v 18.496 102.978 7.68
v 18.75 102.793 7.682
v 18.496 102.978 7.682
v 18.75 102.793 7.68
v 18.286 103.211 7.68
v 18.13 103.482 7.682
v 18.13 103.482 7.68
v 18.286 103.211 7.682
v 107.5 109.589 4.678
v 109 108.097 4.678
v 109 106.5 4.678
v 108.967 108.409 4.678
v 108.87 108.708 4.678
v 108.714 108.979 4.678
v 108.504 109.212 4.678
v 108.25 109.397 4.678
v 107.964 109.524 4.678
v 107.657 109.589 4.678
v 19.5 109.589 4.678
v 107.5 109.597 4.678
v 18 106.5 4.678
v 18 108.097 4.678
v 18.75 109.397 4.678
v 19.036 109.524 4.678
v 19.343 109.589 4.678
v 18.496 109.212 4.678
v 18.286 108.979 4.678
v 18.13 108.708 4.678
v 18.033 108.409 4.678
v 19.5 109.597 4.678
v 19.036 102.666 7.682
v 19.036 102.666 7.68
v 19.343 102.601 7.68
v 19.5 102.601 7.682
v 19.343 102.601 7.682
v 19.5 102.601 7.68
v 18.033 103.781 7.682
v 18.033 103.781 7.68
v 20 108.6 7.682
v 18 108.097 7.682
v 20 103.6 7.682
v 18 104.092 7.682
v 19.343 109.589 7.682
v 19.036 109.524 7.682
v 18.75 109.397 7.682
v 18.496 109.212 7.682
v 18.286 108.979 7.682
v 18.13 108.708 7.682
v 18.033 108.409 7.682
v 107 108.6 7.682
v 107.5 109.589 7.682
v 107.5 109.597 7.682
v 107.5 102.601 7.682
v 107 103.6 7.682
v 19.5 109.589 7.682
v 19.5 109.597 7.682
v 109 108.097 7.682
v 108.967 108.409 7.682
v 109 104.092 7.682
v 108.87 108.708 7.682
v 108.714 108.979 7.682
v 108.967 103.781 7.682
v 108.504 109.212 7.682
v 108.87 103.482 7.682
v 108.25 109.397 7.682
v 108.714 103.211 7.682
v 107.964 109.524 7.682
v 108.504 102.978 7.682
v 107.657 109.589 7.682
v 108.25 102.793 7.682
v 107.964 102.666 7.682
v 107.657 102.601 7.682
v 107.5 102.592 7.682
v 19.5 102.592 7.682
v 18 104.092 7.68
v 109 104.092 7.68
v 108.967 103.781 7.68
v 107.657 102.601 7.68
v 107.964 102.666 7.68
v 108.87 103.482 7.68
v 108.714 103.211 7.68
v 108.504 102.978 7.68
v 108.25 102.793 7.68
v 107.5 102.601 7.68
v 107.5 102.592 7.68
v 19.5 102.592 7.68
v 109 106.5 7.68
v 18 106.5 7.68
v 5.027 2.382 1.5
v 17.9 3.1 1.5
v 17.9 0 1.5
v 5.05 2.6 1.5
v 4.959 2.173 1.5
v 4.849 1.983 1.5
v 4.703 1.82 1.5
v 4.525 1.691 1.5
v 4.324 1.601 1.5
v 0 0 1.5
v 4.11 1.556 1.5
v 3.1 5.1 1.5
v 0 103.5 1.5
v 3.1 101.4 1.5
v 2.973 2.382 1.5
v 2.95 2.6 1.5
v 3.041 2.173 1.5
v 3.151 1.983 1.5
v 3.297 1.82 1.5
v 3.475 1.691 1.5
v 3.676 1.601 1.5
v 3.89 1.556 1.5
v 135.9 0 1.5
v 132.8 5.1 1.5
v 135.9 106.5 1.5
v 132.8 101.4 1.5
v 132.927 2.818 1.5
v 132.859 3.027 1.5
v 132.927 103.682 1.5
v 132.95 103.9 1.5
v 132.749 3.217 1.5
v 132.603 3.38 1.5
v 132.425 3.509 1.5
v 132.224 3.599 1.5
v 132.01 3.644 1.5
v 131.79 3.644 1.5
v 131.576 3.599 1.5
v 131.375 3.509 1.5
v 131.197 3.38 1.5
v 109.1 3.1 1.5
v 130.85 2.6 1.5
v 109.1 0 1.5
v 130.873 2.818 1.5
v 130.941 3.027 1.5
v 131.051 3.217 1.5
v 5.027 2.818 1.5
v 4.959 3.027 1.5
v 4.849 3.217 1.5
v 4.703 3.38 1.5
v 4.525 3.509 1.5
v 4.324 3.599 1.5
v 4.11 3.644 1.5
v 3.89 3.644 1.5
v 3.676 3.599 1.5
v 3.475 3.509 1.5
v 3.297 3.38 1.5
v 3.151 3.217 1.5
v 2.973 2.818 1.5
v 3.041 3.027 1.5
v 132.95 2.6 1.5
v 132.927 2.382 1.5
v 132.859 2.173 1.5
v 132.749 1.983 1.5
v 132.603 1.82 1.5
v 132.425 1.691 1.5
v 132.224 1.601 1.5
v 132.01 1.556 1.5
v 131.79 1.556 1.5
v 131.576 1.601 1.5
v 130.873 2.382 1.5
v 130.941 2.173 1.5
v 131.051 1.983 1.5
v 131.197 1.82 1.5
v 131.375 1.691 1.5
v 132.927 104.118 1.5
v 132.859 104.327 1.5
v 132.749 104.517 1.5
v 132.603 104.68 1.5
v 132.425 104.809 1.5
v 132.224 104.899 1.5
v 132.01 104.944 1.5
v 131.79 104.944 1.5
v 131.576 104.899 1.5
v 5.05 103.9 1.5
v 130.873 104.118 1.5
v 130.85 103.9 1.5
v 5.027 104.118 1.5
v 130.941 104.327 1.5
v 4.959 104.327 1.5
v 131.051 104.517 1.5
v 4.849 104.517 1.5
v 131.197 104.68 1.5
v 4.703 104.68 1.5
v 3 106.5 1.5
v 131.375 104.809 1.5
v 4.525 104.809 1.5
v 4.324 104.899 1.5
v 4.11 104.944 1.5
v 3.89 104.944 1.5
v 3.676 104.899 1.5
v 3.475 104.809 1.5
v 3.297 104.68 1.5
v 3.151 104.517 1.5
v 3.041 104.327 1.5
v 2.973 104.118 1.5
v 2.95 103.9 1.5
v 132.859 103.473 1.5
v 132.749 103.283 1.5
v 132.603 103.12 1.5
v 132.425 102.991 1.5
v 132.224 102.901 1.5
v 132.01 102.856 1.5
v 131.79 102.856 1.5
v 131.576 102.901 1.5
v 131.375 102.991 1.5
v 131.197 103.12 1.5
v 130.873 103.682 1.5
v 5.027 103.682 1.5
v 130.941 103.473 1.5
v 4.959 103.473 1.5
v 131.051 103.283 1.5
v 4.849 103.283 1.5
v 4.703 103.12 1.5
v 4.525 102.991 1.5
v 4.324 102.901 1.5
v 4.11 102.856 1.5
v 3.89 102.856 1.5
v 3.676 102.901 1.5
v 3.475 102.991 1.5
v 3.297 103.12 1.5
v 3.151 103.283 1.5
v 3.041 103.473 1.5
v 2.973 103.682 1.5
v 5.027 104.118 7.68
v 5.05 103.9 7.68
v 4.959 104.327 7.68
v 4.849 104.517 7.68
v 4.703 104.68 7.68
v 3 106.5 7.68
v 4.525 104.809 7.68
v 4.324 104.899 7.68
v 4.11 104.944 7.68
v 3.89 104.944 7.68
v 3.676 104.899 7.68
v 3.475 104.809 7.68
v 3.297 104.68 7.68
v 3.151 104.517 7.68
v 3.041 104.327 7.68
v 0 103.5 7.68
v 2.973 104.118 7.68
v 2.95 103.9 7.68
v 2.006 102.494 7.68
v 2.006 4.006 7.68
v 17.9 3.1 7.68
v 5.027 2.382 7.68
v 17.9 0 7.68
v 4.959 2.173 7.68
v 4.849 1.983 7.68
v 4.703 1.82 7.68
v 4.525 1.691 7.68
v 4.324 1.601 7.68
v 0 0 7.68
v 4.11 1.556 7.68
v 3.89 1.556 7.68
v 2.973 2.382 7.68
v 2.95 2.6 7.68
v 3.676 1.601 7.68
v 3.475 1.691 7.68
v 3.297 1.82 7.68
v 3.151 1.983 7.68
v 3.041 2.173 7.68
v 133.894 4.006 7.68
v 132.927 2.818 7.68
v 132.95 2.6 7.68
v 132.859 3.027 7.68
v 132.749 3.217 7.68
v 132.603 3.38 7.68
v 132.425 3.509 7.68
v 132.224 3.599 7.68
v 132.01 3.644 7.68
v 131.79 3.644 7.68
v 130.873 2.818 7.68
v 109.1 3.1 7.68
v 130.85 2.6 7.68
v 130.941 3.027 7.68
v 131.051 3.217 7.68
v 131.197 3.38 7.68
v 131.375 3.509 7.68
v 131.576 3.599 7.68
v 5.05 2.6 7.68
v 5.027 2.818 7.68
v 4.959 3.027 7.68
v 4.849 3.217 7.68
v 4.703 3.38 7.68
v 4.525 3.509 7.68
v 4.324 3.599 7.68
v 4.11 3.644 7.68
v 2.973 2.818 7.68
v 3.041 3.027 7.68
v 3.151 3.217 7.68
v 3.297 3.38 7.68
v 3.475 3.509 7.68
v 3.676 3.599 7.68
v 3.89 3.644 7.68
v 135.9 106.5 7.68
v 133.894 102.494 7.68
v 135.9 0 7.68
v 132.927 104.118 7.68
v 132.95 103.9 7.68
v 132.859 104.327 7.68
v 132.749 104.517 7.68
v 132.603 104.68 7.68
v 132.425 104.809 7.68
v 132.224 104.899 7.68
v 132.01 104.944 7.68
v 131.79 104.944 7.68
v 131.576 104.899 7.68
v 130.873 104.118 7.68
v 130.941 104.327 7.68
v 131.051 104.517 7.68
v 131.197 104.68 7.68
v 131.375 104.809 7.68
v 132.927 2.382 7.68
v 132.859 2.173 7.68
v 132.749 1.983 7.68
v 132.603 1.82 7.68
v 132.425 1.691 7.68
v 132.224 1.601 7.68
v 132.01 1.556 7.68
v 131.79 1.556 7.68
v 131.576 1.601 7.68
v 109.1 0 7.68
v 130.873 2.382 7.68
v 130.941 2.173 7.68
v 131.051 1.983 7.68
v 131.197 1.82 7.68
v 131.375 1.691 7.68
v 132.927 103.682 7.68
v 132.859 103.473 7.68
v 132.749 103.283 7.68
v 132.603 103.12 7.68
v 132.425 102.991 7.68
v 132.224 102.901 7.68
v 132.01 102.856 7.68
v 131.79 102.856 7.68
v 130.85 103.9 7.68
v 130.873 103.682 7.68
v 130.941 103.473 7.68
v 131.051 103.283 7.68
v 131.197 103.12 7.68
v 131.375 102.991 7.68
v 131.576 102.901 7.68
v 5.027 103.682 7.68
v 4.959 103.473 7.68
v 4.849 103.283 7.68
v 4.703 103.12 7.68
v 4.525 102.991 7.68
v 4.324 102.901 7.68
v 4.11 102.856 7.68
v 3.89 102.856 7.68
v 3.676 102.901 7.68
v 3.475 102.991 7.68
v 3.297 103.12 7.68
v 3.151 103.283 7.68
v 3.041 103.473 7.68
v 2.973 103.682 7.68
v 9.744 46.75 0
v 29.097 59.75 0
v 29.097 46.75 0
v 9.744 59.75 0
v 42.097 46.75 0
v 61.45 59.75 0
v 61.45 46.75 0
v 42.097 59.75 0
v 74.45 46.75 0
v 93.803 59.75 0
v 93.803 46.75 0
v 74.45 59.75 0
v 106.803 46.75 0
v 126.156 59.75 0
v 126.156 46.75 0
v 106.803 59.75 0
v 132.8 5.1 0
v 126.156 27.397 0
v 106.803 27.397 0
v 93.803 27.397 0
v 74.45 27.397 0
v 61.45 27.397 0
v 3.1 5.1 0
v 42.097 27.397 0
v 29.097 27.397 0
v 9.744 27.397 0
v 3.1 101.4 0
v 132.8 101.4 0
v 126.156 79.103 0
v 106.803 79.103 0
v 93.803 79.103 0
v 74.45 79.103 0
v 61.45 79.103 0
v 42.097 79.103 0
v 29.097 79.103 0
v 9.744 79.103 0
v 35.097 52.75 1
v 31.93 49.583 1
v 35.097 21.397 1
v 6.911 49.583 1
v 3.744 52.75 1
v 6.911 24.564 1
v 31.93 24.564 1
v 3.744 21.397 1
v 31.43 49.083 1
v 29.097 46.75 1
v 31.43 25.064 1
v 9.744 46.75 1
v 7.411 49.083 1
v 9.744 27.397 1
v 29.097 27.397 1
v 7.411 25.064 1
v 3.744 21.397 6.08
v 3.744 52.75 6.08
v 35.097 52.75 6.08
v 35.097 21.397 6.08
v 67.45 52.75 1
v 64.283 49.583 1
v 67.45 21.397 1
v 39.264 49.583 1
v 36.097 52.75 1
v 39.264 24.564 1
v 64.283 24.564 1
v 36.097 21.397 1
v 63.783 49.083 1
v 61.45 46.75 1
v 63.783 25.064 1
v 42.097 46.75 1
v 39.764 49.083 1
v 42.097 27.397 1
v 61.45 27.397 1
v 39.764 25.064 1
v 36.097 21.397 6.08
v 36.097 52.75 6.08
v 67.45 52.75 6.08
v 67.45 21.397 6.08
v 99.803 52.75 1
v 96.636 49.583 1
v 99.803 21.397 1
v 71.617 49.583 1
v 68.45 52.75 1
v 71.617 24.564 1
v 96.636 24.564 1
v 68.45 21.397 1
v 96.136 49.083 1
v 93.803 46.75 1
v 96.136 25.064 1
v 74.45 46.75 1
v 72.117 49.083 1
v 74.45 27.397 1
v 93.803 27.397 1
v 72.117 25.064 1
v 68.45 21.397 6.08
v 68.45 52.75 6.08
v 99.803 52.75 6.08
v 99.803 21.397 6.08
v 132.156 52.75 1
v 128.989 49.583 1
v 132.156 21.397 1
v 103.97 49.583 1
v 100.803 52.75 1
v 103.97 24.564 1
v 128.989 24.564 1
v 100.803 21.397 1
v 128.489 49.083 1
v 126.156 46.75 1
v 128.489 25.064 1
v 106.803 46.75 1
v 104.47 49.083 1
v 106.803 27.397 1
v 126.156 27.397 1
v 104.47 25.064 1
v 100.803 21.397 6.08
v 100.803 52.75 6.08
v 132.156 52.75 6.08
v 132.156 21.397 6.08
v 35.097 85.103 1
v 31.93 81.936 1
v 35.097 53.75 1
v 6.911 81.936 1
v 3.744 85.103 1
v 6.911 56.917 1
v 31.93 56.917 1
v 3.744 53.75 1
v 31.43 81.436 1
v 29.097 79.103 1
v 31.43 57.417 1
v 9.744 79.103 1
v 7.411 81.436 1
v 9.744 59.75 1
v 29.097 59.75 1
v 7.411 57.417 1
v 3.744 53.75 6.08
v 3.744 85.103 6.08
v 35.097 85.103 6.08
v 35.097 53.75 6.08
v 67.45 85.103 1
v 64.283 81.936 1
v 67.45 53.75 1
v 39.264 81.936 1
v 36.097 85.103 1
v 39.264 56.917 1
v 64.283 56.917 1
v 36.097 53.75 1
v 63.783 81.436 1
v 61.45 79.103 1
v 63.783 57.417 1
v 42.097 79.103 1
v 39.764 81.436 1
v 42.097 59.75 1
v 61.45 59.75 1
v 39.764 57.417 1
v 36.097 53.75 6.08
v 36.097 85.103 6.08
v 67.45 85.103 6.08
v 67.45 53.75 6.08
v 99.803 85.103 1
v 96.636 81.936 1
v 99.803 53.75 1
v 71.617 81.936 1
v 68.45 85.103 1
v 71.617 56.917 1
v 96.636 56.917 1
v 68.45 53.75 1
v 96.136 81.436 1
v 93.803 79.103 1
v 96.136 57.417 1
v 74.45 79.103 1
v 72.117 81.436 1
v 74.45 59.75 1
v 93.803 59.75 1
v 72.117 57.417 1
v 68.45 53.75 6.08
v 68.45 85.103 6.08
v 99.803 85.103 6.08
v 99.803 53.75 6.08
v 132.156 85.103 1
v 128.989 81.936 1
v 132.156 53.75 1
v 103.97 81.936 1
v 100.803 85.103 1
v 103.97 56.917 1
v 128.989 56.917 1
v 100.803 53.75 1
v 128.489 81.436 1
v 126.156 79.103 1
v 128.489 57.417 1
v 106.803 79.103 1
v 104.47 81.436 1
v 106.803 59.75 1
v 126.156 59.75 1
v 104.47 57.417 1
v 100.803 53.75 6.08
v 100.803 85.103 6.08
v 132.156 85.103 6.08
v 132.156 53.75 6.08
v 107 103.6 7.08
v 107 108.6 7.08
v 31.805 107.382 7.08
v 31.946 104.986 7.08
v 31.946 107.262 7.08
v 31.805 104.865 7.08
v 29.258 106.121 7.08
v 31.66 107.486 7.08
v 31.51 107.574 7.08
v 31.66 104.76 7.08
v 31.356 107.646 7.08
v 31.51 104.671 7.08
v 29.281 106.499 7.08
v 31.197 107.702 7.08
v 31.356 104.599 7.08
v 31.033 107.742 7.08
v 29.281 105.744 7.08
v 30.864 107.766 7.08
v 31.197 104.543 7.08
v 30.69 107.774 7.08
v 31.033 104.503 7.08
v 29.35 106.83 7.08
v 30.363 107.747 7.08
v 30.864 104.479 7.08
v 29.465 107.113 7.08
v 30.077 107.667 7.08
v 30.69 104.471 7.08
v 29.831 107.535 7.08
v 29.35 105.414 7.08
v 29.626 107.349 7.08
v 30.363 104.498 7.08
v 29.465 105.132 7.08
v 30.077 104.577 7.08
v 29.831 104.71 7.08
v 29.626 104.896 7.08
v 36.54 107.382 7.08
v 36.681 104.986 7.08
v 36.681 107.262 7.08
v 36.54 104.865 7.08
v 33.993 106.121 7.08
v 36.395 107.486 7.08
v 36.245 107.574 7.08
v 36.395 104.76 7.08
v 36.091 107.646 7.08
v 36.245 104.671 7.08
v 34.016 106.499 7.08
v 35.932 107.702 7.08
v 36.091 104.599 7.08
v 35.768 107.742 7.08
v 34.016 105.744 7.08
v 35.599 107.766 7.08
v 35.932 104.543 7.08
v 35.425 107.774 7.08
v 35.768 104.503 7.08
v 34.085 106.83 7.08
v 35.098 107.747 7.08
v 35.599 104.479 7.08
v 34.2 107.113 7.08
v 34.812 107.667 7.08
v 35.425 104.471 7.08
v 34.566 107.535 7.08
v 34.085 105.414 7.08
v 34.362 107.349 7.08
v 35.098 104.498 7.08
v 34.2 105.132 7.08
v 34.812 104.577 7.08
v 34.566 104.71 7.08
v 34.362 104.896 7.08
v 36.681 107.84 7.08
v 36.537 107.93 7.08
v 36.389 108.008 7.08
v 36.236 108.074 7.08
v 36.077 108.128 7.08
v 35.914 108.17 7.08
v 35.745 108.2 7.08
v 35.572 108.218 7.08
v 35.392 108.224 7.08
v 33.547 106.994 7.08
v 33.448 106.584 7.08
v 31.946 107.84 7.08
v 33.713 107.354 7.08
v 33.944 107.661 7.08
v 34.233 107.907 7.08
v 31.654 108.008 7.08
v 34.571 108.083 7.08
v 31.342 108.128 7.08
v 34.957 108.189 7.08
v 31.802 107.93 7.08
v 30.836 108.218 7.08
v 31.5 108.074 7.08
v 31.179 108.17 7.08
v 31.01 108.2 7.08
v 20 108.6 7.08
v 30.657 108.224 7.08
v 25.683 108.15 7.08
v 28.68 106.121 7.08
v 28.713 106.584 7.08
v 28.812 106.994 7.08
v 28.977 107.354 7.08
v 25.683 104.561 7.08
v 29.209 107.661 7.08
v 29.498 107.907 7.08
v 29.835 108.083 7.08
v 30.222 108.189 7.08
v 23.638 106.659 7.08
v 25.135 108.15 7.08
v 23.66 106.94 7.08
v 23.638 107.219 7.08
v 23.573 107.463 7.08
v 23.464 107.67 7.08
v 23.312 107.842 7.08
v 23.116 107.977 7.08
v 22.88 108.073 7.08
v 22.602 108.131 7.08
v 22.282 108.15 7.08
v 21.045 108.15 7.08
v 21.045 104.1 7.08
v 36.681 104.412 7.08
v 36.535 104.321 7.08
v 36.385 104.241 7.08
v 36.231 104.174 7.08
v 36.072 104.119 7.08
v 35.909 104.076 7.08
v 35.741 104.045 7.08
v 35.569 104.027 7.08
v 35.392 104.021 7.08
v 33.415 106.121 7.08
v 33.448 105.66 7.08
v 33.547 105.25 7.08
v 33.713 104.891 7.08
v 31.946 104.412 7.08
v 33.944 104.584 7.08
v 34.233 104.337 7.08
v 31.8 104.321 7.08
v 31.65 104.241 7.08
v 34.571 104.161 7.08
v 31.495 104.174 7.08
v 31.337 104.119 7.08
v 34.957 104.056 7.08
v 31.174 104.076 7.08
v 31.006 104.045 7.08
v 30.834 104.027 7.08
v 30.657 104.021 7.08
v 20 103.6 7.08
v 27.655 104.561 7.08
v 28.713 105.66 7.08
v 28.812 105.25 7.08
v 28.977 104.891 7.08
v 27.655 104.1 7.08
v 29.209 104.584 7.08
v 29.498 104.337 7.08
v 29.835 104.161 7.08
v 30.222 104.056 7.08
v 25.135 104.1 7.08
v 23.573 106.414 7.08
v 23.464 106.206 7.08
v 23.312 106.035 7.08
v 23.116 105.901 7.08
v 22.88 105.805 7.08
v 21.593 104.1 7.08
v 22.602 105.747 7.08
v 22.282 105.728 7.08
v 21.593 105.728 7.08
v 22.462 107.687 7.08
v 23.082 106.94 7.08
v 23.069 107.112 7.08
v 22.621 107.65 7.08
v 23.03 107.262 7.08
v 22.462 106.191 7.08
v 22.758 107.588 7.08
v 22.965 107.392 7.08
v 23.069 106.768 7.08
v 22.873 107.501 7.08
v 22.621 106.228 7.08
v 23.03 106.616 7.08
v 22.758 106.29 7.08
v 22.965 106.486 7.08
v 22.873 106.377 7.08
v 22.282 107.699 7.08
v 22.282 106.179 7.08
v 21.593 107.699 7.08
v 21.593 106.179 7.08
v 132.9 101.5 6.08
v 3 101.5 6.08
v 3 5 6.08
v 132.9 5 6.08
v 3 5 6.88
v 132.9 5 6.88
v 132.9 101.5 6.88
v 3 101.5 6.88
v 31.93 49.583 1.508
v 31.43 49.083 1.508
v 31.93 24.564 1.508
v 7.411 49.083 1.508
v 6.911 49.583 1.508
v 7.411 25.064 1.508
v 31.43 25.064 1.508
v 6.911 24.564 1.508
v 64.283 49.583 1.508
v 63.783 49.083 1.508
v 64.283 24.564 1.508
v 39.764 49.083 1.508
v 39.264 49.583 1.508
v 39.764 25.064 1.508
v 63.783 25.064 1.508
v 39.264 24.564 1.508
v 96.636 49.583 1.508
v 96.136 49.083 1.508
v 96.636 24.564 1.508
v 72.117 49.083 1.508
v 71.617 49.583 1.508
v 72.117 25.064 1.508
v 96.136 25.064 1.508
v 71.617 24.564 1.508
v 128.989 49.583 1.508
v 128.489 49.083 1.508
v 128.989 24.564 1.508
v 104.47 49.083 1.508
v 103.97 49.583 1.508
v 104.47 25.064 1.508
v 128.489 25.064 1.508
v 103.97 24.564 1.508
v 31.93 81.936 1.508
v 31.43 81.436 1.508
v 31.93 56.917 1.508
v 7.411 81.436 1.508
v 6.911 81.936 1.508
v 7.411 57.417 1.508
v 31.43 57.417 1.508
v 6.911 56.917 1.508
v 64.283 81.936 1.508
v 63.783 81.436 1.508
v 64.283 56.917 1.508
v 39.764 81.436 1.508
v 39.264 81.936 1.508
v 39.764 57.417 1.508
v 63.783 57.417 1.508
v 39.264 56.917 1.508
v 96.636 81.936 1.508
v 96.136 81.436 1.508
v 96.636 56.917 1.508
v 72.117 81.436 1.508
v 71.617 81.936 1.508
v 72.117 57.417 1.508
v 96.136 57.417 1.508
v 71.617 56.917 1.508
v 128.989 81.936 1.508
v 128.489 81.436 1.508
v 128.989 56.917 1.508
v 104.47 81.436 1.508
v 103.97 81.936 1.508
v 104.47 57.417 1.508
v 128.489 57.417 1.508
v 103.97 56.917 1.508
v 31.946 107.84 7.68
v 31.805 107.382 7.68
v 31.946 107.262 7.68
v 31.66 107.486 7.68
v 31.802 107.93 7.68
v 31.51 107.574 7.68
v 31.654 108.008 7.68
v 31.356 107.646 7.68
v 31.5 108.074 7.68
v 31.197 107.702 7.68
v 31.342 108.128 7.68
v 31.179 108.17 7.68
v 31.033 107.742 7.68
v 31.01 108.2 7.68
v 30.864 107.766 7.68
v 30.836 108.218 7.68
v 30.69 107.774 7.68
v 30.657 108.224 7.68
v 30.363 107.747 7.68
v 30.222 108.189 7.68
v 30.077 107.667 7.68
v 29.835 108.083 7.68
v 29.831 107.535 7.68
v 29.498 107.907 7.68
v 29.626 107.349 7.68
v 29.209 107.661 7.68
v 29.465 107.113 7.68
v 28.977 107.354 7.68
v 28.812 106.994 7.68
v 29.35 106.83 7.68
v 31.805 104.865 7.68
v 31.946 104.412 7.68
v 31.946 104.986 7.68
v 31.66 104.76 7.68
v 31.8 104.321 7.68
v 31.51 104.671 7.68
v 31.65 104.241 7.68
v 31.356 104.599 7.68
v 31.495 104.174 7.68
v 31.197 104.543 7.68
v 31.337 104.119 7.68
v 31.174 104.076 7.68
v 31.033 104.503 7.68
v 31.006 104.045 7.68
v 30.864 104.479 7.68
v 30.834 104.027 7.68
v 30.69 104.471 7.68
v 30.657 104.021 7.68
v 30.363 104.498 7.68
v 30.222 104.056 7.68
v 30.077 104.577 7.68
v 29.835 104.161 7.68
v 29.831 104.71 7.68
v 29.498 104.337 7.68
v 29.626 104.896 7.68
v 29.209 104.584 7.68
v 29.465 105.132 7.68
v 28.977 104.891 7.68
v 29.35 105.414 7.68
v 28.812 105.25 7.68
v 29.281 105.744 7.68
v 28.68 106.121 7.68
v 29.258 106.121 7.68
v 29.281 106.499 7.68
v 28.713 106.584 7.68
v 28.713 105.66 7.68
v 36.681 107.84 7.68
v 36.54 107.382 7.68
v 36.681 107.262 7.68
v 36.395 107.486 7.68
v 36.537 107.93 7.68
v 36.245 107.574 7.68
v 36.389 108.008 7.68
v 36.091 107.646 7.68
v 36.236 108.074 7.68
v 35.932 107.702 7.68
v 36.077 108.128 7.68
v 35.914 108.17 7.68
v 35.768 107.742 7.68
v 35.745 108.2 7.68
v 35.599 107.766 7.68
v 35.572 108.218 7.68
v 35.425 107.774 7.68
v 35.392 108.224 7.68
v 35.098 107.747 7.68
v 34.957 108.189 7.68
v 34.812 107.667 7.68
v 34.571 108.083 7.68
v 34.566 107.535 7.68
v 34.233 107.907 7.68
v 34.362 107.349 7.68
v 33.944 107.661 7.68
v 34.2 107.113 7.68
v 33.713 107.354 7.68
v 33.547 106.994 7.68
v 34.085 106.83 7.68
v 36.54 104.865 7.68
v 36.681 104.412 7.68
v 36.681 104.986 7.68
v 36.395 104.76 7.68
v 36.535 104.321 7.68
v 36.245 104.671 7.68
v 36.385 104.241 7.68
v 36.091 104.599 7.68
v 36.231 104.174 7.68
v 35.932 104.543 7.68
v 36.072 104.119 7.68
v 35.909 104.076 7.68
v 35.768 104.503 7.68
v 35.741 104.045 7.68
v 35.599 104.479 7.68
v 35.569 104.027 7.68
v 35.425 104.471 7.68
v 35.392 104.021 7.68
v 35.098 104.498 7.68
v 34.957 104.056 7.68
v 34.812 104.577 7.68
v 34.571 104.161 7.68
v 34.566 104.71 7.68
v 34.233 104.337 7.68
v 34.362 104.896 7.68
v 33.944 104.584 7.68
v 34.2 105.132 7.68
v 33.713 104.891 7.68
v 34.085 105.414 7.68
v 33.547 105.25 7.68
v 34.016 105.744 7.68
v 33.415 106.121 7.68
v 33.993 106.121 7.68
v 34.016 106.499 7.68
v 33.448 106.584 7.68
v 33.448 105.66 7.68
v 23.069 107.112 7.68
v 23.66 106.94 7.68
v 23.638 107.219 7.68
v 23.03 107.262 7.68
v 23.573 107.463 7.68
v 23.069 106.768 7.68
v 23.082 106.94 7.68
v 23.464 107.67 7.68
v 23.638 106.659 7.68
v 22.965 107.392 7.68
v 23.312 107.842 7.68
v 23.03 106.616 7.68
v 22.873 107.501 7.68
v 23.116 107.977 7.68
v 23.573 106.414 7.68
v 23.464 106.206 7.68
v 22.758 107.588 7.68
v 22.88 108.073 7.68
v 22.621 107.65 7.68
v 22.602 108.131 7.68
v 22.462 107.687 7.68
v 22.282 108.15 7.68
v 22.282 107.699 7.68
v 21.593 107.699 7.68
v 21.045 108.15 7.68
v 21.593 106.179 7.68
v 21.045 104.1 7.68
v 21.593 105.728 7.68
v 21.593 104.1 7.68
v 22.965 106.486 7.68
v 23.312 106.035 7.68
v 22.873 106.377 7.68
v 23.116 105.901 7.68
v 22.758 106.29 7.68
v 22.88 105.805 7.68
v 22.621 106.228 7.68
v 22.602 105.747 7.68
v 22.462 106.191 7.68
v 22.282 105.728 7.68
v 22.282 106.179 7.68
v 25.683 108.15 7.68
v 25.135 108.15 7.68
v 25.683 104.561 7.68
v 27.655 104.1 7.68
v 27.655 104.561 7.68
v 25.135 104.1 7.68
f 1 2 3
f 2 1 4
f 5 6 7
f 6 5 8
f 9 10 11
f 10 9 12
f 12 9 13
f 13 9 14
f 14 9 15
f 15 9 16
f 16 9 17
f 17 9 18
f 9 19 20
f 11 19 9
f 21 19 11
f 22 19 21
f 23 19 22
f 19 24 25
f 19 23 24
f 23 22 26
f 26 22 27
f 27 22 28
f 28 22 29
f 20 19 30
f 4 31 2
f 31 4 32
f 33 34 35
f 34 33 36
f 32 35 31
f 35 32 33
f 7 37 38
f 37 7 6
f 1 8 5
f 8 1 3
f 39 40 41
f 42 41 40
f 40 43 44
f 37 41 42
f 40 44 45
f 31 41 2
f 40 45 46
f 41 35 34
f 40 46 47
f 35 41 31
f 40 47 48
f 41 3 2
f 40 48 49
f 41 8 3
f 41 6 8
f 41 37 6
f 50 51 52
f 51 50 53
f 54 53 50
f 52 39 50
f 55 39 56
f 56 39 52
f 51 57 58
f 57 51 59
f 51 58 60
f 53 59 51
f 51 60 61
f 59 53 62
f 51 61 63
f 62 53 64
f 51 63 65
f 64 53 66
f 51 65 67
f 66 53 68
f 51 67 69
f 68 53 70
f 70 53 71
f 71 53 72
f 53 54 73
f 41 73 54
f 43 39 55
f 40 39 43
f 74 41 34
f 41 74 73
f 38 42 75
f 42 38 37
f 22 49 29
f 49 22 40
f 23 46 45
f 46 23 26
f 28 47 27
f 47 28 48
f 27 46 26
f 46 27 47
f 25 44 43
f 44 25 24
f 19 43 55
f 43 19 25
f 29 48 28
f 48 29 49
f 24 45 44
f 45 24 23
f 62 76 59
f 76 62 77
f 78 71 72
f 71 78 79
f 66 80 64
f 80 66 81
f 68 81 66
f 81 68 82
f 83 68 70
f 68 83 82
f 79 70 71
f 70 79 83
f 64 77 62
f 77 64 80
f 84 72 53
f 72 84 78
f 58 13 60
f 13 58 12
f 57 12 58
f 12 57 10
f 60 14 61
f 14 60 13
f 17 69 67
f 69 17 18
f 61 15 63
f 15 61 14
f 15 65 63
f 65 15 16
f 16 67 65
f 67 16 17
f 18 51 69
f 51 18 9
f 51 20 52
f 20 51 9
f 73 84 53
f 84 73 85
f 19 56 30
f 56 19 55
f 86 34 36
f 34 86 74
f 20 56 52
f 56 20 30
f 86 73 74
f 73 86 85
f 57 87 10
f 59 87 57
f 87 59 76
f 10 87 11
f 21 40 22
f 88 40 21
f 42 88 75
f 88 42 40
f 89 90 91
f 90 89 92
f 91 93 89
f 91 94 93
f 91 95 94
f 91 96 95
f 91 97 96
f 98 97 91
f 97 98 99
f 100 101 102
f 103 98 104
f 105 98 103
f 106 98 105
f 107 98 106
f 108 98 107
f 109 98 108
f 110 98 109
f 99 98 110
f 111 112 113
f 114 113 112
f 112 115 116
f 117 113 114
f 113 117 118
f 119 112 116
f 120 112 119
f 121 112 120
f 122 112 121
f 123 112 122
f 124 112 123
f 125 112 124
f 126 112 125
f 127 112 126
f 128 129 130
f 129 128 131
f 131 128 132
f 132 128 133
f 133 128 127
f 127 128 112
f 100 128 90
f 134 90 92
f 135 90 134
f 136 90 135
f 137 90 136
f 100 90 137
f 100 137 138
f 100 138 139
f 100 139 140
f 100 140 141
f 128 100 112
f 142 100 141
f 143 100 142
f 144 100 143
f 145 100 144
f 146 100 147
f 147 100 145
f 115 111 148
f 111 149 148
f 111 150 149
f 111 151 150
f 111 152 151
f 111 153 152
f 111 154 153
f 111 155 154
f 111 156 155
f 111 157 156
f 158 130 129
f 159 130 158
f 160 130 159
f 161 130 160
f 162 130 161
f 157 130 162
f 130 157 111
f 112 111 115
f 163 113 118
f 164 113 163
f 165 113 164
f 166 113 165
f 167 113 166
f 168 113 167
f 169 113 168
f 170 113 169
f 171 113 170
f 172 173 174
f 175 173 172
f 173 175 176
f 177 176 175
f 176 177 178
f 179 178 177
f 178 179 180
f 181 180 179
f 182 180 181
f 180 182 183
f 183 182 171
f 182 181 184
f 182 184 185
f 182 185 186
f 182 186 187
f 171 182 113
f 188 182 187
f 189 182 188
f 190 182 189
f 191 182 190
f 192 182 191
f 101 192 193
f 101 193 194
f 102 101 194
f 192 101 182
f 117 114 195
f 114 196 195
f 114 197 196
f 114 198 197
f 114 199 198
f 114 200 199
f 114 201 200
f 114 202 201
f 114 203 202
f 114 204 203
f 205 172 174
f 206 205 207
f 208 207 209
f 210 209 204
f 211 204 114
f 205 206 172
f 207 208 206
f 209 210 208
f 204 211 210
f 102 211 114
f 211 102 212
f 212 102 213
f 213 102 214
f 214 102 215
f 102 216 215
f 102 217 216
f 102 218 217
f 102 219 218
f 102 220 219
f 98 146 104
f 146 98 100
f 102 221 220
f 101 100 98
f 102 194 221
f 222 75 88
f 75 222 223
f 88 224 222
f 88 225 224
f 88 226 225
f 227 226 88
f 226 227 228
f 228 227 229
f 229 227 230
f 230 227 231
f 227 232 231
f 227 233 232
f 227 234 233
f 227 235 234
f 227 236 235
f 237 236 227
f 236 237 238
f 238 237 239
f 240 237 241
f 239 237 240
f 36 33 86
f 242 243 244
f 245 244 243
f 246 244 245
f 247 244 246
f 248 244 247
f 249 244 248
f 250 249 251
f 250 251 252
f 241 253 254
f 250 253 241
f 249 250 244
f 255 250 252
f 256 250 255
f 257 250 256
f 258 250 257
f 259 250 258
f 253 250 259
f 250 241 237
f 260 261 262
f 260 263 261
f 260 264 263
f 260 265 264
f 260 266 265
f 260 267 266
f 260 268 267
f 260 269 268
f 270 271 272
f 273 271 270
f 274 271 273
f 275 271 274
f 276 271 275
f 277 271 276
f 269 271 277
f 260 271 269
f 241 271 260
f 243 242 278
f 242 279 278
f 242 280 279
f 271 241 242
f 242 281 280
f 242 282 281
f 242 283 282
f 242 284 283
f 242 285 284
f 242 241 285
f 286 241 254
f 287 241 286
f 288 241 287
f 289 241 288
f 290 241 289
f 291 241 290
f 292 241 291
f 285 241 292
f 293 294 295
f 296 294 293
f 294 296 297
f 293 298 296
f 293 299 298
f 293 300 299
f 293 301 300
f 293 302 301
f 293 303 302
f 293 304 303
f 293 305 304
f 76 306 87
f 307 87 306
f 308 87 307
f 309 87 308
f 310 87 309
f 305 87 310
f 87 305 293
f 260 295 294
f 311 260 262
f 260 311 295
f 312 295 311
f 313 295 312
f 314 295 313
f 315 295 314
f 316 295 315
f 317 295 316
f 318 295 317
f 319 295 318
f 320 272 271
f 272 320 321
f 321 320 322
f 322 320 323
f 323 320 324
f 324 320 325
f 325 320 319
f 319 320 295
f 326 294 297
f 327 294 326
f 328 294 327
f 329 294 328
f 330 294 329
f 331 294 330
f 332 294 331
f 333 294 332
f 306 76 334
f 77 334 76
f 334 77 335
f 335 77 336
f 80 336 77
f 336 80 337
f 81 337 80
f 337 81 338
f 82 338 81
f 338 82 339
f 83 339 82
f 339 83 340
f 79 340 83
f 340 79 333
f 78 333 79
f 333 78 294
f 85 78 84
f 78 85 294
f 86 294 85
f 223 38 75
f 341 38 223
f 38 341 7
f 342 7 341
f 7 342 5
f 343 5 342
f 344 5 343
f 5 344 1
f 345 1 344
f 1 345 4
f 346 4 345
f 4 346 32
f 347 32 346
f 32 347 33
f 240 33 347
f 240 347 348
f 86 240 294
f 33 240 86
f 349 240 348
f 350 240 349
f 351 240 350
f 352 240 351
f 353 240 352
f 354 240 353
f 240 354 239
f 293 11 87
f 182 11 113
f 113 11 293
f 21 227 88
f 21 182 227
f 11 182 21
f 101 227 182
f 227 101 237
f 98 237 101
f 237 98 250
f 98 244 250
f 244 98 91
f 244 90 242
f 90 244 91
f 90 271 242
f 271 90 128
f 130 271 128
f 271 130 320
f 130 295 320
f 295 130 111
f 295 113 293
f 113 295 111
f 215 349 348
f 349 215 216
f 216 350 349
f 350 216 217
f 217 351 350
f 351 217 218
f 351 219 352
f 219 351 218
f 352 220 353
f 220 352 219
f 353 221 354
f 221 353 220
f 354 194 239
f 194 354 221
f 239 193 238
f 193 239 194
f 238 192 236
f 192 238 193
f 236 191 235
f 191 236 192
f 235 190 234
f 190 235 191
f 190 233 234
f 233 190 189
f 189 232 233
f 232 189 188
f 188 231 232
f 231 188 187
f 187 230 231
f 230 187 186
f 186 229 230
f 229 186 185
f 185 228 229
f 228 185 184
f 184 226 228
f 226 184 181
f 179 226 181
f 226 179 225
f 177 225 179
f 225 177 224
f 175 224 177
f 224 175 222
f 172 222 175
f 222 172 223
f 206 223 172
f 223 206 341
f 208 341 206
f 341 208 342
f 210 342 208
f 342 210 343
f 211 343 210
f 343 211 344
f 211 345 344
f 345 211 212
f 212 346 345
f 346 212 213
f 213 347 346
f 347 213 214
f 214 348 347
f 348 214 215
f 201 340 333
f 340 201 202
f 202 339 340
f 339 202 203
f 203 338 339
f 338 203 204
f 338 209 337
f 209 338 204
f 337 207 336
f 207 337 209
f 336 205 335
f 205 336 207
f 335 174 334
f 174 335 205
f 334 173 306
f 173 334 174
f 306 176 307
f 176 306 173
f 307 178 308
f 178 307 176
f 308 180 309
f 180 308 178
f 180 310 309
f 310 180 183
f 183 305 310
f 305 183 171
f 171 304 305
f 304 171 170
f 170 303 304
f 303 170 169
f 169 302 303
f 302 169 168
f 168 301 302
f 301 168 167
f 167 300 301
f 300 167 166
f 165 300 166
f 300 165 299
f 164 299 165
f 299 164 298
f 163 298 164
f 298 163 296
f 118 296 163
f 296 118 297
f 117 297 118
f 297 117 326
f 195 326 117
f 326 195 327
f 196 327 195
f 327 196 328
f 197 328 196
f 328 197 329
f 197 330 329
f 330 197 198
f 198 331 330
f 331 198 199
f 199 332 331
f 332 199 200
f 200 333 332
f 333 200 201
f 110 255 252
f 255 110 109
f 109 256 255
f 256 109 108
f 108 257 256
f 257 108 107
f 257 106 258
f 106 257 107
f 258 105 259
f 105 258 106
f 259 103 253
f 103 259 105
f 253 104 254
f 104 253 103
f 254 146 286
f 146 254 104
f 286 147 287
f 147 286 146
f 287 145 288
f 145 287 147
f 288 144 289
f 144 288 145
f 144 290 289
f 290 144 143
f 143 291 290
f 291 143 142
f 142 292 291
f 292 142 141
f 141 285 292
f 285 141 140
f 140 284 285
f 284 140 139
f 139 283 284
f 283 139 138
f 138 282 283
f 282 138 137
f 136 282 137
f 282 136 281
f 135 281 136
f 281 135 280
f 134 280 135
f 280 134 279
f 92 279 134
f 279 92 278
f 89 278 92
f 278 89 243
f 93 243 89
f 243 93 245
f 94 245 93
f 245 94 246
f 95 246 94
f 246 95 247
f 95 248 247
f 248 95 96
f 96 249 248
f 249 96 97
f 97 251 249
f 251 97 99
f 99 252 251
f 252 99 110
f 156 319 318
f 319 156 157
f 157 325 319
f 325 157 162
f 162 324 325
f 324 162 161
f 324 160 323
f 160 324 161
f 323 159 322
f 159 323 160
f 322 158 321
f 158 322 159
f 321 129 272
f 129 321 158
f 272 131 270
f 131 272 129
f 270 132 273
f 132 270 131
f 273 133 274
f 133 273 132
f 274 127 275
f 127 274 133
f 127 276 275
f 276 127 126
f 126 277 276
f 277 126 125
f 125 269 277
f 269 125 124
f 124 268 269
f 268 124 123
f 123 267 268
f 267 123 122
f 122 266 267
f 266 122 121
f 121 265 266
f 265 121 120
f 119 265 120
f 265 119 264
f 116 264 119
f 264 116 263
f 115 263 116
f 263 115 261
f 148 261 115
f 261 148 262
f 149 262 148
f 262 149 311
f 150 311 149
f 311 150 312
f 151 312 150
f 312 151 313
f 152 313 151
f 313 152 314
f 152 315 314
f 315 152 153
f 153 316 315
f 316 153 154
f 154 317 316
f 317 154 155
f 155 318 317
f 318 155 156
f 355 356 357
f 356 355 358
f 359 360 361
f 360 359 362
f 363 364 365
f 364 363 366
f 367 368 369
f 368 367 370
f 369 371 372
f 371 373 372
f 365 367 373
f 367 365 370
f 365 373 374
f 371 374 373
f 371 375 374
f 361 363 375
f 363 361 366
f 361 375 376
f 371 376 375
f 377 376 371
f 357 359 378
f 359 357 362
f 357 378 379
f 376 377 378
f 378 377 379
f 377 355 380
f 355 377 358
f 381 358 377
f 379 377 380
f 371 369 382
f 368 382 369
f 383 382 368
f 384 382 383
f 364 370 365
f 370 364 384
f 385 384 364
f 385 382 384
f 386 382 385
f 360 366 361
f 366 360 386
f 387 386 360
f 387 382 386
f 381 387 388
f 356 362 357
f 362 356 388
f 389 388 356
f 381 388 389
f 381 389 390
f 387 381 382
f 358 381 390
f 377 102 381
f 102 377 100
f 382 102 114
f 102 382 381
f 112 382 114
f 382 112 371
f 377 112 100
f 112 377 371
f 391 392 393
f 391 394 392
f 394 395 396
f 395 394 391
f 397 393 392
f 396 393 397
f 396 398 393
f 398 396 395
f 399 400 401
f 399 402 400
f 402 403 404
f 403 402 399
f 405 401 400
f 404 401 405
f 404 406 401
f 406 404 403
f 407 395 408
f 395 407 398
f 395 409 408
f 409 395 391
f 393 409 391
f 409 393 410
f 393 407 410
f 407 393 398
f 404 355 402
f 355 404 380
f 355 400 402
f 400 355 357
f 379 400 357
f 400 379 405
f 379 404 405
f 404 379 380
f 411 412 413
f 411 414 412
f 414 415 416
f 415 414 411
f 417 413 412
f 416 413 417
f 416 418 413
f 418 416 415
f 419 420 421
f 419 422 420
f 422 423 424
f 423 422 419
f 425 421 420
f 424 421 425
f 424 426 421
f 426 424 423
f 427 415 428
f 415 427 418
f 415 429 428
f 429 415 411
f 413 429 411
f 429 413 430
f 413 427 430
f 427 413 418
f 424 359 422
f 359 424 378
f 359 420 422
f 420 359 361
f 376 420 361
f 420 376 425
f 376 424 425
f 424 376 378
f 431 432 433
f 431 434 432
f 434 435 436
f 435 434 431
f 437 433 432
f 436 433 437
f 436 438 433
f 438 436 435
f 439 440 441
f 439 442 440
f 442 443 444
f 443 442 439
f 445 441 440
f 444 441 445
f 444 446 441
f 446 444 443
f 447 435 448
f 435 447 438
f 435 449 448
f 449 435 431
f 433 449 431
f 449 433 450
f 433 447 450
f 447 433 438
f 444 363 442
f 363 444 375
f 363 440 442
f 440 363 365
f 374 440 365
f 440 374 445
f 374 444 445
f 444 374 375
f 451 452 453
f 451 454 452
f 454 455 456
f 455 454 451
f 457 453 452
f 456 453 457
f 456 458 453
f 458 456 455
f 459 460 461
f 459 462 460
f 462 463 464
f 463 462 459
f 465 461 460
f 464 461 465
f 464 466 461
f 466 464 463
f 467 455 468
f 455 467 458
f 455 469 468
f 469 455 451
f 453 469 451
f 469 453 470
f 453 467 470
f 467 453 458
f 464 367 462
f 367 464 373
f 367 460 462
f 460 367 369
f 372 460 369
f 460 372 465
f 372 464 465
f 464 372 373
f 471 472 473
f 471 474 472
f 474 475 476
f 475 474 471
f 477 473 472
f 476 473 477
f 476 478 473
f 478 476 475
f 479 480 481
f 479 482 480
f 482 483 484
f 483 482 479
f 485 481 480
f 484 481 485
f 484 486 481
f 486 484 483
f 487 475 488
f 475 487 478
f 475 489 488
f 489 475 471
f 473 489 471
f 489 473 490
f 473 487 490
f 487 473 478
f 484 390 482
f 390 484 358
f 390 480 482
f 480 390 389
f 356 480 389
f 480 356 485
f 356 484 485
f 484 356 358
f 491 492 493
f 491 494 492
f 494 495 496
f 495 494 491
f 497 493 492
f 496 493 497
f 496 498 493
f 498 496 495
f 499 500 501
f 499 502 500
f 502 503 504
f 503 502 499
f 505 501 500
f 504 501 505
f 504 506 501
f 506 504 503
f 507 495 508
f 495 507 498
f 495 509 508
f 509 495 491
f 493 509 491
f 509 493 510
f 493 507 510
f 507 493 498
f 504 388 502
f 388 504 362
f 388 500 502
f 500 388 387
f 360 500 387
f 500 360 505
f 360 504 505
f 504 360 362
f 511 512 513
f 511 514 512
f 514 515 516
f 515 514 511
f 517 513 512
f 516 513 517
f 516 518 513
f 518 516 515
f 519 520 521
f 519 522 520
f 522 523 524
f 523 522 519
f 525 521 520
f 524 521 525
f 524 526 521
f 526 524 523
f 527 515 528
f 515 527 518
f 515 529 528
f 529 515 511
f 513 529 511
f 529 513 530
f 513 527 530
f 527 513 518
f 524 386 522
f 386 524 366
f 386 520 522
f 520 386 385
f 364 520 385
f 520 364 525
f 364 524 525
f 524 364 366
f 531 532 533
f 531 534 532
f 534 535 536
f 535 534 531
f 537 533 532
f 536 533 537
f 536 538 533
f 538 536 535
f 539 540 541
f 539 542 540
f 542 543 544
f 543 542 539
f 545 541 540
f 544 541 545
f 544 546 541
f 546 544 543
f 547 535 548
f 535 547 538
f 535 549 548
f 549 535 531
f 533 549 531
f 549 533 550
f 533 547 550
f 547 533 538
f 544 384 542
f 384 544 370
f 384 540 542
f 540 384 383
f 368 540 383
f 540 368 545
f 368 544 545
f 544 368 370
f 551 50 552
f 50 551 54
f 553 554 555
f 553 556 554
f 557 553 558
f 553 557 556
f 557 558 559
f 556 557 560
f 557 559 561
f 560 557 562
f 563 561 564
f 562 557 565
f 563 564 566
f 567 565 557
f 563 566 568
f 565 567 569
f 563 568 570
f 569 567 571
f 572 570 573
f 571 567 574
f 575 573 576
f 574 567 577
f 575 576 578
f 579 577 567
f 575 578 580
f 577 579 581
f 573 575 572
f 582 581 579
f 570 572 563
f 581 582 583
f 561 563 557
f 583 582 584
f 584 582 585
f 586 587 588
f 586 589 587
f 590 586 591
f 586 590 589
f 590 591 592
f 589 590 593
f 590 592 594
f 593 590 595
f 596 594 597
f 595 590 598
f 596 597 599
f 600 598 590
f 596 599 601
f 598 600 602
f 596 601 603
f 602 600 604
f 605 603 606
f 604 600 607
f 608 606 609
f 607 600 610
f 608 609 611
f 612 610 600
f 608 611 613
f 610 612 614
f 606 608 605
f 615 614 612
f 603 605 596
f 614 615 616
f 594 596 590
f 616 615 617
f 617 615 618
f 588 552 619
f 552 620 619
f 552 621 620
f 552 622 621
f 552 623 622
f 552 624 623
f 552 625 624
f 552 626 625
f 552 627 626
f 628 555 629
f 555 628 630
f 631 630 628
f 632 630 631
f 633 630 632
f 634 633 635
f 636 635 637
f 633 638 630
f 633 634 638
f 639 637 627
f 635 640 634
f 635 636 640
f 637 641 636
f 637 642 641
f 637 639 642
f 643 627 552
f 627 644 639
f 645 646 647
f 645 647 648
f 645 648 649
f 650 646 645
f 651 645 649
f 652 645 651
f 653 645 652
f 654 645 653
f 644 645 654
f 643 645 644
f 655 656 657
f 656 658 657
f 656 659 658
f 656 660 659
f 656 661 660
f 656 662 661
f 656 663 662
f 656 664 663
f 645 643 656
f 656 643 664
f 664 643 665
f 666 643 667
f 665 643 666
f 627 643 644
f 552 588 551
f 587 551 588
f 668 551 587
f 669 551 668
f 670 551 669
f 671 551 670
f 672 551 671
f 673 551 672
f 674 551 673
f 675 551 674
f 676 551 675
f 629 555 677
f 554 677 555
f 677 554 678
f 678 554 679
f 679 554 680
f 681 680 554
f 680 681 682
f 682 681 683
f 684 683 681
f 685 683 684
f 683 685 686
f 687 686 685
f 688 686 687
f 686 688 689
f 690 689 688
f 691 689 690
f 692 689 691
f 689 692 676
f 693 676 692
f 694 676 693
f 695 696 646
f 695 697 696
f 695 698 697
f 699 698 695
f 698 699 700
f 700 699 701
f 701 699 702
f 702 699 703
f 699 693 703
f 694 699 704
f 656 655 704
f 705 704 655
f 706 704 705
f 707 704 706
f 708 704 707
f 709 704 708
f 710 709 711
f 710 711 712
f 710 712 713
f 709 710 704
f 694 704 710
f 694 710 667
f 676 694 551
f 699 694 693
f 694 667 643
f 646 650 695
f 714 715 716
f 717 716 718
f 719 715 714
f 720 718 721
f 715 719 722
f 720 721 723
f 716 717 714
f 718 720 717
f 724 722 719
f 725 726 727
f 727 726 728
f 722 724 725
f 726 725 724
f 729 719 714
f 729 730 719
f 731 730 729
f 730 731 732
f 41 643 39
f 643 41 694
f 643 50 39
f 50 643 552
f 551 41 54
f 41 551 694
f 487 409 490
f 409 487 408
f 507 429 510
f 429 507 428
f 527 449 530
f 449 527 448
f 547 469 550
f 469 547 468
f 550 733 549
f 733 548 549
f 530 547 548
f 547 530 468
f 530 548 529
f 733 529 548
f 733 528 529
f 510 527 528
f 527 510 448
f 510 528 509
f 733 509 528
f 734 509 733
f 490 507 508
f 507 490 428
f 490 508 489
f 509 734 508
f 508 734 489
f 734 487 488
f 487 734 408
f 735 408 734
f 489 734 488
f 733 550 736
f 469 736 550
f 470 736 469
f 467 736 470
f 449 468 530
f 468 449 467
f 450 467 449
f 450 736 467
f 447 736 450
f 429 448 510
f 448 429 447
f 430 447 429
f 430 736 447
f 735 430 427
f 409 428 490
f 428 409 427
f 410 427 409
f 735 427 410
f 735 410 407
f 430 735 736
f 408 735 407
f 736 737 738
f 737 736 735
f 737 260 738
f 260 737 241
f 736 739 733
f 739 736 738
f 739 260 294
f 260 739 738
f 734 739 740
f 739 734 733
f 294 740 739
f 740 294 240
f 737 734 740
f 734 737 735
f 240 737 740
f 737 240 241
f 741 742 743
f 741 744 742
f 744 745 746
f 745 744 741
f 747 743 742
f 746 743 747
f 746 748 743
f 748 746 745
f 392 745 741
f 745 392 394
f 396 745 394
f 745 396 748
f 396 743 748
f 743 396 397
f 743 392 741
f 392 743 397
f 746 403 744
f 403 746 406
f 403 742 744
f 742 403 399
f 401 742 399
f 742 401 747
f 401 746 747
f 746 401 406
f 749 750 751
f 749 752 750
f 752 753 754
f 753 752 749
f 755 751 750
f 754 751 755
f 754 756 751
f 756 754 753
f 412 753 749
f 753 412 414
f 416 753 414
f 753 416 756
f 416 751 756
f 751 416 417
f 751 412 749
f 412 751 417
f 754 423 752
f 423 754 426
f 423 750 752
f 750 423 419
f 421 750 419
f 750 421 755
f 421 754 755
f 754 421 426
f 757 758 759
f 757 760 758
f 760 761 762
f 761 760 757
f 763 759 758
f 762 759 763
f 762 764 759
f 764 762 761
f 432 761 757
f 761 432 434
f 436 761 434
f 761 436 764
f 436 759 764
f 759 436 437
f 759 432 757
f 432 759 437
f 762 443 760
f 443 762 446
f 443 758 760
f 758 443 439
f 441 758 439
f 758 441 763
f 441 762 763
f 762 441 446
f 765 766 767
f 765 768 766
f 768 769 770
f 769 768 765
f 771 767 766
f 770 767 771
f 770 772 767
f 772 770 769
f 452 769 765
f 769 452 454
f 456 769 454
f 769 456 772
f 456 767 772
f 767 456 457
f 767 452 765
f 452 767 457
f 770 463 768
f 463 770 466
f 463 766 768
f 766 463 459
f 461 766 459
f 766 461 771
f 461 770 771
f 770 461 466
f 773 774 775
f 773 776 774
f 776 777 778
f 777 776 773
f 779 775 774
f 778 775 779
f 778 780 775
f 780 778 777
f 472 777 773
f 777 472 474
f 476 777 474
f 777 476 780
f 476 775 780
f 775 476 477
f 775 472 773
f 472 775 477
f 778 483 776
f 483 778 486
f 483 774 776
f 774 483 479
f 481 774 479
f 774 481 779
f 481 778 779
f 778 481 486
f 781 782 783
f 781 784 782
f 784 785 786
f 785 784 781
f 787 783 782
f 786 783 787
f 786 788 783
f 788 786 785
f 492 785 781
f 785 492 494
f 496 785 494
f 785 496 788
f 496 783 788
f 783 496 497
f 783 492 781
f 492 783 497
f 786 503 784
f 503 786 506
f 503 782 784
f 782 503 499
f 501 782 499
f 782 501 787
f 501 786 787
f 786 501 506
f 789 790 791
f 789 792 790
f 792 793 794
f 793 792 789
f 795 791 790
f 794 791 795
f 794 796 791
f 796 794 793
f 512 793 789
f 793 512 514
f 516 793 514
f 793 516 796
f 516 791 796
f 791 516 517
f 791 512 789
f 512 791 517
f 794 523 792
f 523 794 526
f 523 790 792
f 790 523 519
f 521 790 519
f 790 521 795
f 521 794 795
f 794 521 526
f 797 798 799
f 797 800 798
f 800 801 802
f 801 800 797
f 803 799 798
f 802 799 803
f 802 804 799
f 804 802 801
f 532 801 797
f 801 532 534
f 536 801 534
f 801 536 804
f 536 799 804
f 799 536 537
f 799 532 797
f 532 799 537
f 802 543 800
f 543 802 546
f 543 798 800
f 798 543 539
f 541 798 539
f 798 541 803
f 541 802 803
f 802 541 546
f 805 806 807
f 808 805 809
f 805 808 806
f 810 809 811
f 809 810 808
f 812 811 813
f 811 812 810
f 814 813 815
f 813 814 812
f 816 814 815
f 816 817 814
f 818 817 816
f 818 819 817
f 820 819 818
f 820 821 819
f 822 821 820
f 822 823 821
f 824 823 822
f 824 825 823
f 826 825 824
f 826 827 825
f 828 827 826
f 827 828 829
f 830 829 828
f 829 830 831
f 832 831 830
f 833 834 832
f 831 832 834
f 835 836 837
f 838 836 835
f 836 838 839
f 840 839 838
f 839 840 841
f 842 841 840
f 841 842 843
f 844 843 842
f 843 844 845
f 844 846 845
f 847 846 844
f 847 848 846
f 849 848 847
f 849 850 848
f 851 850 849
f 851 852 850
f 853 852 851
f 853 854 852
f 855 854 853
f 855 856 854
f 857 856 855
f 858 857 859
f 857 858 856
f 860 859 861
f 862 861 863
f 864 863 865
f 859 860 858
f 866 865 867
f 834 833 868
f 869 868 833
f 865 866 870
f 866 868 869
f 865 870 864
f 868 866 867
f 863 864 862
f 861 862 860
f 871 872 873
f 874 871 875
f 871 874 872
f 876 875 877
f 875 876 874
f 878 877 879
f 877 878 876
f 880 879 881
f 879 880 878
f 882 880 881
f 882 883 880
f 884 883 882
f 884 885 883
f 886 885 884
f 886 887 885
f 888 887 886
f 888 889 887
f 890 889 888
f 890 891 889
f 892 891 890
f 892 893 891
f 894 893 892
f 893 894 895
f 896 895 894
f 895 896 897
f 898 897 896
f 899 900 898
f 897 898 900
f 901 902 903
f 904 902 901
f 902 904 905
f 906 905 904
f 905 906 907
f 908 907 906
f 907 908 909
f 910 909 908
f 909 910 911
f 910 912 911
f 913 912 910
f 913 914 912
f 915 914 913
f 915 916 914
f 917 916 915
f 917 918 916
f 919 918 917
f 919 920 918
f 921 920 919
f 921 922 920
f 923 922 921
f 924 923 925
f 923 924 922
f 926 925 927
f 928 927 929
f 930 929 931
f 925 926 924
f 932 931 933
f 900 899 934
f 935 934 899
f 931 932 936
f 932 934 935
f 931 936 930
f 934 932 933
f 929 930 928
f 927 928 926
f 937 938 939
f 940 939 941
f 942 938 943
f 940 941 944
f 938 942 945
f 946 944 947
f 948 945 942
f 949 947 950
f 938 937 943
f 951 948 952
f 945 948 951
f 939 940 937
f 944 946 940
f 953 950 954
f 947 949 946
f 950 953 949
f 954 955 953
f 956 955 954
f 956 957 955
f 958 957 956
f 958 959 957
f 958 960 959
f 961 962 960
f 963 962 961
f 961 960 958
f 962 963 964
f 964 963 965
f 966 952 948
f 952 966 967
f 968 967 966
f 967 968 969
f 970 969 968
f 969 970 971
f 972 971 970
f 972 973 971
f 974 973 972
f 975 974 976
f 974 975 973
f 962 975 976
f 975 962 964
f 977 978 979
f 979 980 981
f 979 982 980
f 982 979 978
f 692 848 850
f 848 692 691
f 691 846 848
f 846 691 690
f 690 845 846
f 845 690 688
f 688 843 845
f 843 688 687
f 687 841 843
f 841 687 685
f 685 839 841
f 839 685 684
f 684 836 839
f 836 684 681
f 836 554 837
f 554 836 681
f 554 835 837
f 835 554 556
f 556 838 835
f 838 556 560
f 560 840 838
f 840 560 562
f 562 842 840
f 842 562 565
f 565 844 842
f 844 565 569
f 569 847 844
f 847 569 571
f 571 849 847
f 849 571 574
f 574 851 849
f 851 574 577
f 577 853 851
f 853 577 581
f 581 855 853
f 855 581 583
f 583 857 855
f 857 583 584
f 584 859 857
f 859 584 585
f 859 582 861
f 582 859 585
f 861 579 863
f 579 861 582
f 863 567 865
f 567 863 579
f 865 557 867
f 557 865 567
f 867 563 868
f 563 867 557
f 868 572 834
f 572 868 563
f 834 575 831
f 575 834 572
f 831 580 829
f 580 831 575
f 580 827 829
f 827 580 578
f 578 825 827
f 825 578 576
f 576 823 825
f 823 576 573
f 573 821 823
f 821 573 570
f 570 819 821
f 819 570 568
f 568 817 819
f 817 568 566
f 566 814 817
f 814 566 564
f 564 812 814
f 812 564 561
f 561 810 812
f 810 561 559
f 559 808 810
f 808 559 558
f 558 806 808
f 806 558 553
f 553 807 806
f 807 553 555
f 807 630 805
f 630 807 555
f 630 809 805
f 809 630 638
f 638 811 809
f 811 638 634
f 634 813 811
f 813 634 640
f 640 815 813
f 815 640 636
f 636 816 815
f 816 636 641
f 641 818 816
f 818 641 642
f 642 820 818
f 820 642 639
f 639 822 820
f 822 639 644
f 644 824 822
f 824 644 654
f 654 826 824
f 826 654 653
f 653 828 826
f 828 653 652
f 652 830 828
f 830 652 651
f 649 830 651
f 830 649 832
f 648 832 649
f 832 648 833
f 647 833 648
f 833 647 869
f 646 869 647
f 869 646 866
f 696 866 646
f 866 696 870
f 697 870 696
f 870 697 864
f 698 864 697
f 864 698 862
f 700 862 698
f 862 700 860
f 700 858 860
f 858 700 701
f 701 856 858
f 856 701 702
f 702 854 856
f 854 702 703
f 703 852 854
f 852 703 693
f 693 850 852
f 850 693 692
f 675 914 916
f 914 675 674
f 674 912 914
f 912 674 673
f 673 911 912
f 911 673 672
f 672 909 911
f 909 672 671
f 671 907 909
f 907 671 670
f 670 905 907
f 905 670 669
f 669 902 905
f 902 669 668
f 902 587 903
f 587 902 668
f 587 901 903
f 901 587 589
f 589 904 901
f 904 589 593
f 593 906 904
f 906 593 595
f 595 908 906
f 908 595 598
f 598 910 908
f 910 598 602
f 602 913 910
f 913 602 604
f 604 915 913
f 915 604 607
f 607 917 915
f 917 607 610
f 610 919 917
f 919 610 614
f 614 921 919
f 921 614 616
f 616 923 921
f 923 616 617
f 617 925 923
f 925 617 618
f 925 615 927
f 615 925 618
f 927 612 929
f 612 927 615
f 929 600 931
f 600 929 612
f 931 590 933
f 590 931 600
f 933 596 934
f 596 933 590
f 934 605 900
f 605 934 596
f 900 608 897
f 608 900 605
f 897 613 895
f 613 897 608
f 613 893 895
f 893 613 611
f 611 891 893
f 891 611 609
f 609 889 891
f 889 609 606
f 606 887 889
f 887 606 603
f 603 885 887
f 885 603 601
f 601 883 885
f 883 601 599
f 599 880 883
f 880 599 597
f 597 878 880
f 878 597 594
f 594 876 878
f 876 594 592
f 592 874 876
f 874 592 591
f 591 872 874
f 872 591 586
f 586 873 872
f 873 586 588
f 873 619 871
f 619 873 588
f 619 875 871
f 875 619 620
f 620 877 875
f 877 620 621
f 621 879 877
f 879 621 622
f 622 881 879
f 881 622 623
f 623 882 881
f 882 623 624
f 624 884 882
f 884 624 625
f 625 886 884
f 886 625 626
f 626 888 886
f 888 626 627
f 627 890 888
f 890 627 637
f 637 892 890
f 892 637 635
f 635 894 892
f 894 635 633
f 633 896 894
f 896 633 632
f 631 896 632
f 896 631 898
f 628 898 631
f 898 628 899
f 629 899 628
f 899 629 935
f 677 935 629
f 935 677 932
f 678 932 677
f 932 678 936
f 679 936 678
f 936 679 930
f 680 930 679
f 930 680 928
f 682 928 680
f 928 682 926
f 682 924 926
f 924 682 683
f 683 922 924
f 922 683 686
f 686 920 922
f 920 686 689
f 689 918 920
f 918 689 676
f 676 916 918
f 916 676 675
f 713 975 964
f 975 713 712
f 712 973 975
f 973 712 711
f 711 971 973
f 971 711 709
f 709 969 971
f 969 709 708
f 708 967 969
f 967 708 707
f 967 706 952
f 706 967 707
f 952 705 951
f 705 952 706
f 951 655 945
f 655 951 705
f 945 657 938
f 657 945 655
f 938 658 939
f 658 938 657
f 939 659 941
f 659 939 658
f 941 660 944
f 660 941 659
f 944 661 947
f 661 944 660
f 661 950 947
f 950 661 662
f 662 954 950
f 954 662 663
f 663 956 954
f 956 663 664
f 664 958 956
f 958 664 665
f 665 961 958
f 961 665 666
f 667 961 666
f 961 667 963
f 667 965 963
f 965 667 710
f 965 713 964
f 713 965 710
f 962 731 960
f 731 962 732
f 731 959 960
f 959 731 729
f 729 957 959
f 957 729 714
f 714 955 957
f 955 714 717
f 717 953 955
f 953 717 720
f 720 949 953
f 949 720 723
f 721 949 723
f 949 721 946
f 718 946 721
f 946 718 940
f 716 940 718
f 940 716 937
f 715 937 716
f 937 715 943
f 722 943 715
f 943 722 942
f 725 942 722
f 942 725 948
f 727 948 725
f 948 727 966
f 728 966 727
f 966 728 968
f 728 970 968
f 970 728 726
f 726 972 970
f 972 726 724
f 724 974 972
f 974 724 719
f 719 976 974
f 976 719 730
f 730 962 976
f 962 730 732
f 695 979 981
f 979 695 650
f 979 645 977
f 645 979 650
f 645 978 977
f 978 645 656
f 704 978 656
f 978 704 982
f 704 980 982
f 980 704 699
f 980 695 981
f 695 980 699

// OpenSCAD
/*
 * Mini JEDEC-style tray for packages conforming to JEDEC MS-018-A
 *
 * Copyright 2024, Rick Altherr
 *
 * Licensed under the Apache License, Version 2.0 (the "License");
 * you may not use this file except in compliance with the License.
 * You may obtain a copy of the License at
 *
 *         http://www.apache.org/licenses/LICENSE-2.0
 *
 * Unless required by applicable law or agreed to in writing, software
 * distributed under the License is distributed on an "AS IS" BASIS,
 * WITHOUT WARRANTIES OR CONDITIONS OF ANY KIND, either express or implied.
 * See the License for the specific language governing permissions and
 * limitations under the License.
 */

/* [Parameters] */

// Text to emboss into the tray's tab
Tab_Text = "PLCC";

// (X, Y, Z) size (in inches) of package including body and pins. Labeled (D, E, A) in MS-018-A.
Package_Size = [1.195, 1.195, 0.200]; // [0:0.001:300]

// Minimum (X, Y) distance (in inches) between centers of pins on opposite edges of package. Labeled (D2, E2) in MS-018-A.
Pin_Center_Distance = [1.090, 1.090]; // [0:0.001:300]

// Minimum distance from the bottom of a pin to the bottom of the package.
Pin_To_Body_Height = 0.020; // 0.001

use <tray.scad>

/* [Hidden] */
$fs = 0.01;

Inch_To_mm = 25.4;

Package_Size_mm = Package_Size * Inch_To_mm;
Pin_Center_Distance_mm = Pin_Center_Distance * Inch_To_mm;
Pin_To_Body_Height_mm = Pin_To_Body_Height * Inch_To_mm;

Tray(
    well_content_size = Package_Size_mm,
    tab_text = Tab_Text
) PLCC_Well();

module PLCC_Well() {
    linear_extrude(height = Pin_To_Body_Height_mm) 
    polygon(
        points = [
            [
                (Package_Size_mm.x - Pin_Center_Distance_mm.x),
                (Package_Size_mm.y - Pin_Center_Distance_mm.y)
            ],
            [
                Package_Size_mm.x - (Package_Size_mm.x - Pin_Center_Distance_mm.x),
                (Package_Size_mm.y - Pin_Center_Distance_mm.y)
            ],
            [
                Package_Size_mm.x - (Package_Size_mm.x - Pin_Center_Distance_mm.x),
                Package_Size_mm.y - (Package_Size_mm.y - Pin_Center_Distance_mm.y),
            ],
            [
                (Package_Size_mm.x - Pin_Center_Distance_mm.x),
                Package_Size_mm.y - (Package_Size_mm.y - Pin_Center_Distance_mm.y),
            ],

            [
                (Package_Size_mm.x - Pin_Center_Distance_mm.x) + 0.5,
                (Package_Size_mm.y - Pin_Center_Distance_mm.y) + 0.5
            ],
            [
                Package_Size_mm.x - (Package_Size_mm.x - Pin_Center_Distance_mm.x) - 0.5,
                (Package_Size_mm.y - Pin_Center_Distance_mm.y) + 0.5
            ],
            [
                Package_Size_mm.x - (Package_Size_mm.x - Pin_Center_Distance_mm.x) - 0.5,
                Package_Size_mm.y - (Package_Size_mm.y - Pin_Center_Distance_mm.y) - 0.5,
            ],
            [
                (Package_Size_mm.x - Pin_Center_Distance_mm.x) + 0.5,
                Package_Size_mm.y - (Package_Size_mm.y - Pin_Center_Distance_mm.y) - 0.5,
            ],
        ],
        paths = [
            [0, 1, 2, 3],
            [4, 5, 6, 7]
        ]
    );
}
